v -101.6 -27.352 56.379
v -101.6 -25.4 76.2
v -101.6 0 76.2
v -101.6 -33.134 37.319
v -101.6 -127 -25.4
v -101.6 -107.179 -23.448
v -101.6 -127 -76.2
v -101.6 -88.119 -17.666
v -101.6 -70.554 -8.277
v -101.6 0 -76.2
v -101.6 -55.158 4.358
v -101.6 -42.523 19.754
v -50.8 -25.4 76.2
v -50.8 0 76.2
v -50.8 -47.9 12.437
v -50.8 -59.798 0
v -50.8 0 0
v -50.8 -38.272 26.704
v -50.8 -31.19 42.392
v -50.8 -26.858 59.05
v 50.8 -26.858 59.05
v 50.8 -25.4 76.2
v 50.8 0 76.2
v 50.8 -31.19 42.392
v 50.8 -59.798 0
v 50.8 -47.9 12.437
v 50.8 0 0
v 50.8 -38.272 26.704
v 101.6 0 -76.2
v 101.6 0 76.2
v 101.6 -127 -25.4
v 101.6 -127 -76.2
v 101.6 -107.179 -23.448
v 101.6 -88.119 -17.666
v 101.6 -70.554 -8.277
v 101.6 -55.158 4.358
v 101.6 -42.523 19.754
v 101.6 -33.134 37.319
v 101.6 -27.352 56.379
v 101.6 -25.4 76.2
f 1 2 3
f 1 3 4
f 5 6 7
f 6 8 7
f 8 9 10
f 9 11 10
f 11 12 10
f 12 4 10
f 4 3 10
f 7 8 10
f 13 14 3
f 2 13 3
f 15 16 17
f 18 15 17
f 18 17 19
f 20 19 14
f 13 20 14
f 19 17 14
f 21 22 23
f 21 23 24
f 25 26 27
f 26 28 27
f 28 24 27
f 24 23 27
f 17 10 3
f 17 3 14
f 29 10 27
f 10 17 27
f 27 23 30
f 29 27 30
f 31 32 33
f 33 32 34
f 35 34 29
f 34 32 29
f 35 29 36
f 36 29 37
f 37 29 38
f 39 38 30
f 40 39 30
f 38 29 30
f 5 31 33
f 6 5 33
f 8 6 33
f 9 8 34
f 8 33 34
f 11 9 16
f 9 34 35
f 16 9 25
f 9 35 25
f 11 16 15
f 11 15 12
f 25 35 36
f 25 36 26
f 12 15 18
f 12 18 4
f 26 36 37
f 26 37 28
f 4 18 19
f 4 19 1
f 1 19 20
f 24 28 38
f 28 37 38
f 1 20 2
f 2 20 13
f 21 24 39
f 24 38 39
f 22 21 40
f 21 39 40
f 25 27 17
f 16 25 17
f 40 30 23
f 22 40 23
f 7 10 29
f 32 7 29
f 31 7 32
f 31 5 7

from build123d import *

# Parameters (mm, degrees)
F1_DEPTH = 127
F3_DEPTH = 203.201


with BuildPart() as f1:
    # F0 (on Front) → F1 (new body)
    with BuildSketch(Plane.XZ):
        Polygon((101.6, -76.2), (101.6, 76.2), (50.8, 76.2), (50.8, 0), (-50.8, 0), (-50.8, 76.2), (-101.6, 76.2), (-101.6, -76.2), align=None)
    extrude(amount=F1_DEPTH)

    # F2 (on face) → F3 (cut, through all)
    with BuildSketch(Plane.YZ.offset(101.6)):
        with BuildLine():
            ThreePointArc((-127, -25.4), (-55.1579510314, 4.3579510314), (-25.4, 76.2))
            Line((-25.4, 76.2), (-127, 76.2))
            Line((-127, 76.2), (-127, -25.4))
        make_face()
    extrude(amount=-F3_DEPTH, mode=Mode.SUBTRACT)


solid = f1.part
